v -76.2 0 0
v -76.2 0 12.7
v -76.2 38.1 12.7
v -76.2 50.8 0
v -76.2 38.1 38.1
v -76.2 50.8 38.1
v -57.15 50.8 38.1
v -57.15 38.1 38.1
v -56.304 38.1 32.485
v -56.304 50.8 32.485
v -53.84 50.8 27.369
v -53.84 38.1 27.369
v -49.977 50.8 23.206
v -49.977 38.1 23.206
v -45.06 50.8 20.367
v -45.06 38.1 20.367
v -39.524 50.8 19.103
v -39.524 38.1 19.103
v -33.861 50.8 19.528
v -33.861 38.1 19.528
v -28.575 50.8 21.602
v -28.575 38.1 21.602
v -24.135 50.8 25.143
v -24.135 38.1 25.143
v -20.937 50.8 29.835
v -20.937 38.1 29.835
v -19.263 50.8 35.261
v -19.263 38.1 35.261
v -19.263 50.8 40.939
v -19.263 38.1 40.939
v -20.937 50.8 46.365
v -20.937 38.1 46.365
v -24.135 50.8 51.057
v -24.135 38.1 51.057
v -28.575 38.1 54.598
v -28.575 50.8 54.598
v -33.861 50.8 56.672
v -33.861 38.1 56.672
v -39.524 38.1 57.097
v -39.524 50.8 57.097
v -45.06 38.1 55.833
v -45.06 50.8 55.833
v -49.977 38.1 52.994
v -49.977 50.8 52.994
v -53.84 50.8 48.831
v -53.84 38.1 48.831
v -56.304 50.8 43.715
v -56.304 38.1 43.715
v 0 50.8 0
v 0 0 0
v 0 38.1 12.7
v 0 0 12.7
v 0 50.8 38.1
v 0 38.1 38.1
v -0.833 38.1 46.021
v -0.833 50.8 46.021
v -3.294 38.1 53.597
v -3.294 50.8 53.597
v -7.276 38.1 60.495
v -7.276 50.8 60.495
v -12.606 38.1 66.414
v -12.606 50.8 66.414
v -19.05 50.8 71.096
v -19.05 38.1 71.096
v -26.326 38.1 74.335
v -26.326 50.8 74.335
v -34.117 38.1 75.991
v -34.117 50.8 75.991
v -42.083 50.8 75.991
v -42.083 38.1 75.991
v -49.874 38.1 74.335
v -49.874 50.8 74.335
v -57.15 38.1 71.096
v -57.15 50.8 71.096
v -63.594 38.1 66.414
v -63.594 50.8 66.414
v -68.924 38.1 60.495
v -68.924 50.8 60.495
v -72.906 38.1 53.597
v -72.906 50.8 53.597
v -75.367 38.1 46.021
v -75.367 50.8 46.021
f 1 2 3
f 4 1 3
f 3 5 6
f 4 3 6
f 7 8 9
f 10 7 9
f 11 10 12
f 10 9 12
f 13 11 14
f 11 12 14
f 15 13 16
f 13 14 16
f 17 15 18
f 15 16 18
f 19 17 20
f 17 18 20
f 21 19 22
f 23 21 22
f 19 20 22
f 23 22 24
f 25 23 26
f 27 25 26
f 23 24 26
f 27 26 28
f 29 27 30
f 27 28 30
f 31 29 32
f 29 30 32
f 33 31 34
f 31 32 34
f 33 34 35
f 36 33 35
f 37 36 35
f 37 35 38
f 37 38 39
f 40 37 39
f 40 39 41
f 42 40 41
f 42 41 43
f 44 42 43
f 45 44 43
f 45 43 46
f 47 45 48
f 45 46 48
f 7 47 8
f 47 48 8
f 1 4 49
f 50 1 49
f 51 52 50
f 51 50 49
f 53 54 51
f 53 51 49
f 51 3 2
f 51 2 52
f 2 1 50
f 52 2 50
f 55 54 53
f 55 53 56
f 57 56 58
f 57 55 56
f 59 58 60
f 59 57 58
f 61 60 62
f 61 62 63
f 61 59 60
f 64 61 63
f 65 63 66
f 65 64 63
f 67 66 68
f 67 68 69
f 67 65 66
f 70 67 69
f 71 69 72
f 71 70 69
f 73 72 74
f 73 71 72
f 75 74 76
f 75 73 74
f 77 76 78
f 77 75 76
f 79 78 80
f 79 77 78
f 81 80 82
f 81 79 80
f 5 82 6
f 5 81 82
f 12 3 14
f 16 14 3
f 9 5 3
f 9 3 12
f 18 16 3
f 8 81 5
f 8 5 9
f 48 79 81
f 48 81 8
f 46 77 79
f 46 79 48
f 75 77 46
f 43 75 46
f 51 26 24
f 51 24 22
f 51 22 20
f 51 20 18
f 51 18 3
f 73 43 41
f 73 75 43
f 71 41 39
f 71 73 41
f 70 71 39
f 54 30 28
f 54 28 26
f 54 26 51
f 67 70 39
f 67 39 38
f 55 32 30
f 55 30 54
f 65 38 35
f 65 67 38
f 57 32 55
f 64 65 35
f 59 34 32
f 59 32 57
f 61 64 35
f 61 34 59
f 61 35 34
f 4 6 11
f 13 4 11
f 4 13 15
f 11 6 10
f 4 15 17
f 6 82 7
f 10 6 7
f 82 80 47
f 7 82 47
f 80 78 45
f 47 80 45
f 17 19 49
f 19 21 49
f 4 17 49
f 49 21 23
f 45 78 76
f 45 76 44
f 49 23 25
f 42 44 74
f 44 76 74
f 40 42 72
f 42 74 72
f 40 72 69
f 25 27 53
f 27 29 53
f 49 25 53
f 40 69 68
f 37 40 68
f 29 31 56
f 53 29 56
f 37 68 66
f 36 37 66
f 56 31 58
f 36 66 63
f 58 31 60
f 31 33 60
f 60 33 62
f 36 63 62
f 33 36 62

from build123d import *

# Parameters (mm, degrees)
F0_W     = 76.2
F0_H     = 50.8
F1_DEPTH = 12.7
F2_W     = 12.7
F2_H     = 25.4
F3_DEPTH = 76.2
F5_DEPTH = 12.7
F7_DEPTH = 30.48


with BuildPart() as f1:
    # F0 (on Top) → F1 (new body)
    with BuildSketch(Plane.XY):
        with Locations((-38.1, 25.4)):
            Rectangle(F0_W, F0_H)
    extrude(amount=F1_DEPTH)

    # F2 (on face) → F3 (join)
    with BuildSketch(Plane.YZ):
        with Locations((44.45, 25.4)):
            Rectangle(F2_W, F2_H)
    extrude(amount=-F3_DEPTH)

    # F4 (on face) → F5 (join)
    with BuildSketch(Plane.XZ.offset(-38.1)):
        with BuildLine():
            Line((-19.05, 38.1), (0, 38.1))
            ThreePointArc((0, 38.1), (-38.1, 76.2), (-76.2, 38.1))
            Line((-76.2, 38.1), (-57.15, 38.1))
            ThreePointArc((-57.15, 38.1), (-38.1, 57.15), (-19.05, 38.1))
        make_face()
    extrude(amount=-F5_DEPTH)

    # F6 (on face) → F7 (cut)
    with BuildSketch(Plane.XZ.offset(-38.1)):
        with BuildLine():
            Line((-57.15, 38.1), (-19.05, 38.1))
            ThreePointArc((-19.05, 38.1), (-38.1, 57.15), (-57.15, 38.1))
        make_face()
        with BuildLine():
            ThreePointArc((-57.15, 38.1), (-38.1, 19.05), (-19.05, 38.1))
            Line((-19.05, 38.1), (-57.15, 38.1))
        make_face()
    extrude(amount=-F7_DEPTH, mode=Mode.SUBTRACT)


solid = f1.part
